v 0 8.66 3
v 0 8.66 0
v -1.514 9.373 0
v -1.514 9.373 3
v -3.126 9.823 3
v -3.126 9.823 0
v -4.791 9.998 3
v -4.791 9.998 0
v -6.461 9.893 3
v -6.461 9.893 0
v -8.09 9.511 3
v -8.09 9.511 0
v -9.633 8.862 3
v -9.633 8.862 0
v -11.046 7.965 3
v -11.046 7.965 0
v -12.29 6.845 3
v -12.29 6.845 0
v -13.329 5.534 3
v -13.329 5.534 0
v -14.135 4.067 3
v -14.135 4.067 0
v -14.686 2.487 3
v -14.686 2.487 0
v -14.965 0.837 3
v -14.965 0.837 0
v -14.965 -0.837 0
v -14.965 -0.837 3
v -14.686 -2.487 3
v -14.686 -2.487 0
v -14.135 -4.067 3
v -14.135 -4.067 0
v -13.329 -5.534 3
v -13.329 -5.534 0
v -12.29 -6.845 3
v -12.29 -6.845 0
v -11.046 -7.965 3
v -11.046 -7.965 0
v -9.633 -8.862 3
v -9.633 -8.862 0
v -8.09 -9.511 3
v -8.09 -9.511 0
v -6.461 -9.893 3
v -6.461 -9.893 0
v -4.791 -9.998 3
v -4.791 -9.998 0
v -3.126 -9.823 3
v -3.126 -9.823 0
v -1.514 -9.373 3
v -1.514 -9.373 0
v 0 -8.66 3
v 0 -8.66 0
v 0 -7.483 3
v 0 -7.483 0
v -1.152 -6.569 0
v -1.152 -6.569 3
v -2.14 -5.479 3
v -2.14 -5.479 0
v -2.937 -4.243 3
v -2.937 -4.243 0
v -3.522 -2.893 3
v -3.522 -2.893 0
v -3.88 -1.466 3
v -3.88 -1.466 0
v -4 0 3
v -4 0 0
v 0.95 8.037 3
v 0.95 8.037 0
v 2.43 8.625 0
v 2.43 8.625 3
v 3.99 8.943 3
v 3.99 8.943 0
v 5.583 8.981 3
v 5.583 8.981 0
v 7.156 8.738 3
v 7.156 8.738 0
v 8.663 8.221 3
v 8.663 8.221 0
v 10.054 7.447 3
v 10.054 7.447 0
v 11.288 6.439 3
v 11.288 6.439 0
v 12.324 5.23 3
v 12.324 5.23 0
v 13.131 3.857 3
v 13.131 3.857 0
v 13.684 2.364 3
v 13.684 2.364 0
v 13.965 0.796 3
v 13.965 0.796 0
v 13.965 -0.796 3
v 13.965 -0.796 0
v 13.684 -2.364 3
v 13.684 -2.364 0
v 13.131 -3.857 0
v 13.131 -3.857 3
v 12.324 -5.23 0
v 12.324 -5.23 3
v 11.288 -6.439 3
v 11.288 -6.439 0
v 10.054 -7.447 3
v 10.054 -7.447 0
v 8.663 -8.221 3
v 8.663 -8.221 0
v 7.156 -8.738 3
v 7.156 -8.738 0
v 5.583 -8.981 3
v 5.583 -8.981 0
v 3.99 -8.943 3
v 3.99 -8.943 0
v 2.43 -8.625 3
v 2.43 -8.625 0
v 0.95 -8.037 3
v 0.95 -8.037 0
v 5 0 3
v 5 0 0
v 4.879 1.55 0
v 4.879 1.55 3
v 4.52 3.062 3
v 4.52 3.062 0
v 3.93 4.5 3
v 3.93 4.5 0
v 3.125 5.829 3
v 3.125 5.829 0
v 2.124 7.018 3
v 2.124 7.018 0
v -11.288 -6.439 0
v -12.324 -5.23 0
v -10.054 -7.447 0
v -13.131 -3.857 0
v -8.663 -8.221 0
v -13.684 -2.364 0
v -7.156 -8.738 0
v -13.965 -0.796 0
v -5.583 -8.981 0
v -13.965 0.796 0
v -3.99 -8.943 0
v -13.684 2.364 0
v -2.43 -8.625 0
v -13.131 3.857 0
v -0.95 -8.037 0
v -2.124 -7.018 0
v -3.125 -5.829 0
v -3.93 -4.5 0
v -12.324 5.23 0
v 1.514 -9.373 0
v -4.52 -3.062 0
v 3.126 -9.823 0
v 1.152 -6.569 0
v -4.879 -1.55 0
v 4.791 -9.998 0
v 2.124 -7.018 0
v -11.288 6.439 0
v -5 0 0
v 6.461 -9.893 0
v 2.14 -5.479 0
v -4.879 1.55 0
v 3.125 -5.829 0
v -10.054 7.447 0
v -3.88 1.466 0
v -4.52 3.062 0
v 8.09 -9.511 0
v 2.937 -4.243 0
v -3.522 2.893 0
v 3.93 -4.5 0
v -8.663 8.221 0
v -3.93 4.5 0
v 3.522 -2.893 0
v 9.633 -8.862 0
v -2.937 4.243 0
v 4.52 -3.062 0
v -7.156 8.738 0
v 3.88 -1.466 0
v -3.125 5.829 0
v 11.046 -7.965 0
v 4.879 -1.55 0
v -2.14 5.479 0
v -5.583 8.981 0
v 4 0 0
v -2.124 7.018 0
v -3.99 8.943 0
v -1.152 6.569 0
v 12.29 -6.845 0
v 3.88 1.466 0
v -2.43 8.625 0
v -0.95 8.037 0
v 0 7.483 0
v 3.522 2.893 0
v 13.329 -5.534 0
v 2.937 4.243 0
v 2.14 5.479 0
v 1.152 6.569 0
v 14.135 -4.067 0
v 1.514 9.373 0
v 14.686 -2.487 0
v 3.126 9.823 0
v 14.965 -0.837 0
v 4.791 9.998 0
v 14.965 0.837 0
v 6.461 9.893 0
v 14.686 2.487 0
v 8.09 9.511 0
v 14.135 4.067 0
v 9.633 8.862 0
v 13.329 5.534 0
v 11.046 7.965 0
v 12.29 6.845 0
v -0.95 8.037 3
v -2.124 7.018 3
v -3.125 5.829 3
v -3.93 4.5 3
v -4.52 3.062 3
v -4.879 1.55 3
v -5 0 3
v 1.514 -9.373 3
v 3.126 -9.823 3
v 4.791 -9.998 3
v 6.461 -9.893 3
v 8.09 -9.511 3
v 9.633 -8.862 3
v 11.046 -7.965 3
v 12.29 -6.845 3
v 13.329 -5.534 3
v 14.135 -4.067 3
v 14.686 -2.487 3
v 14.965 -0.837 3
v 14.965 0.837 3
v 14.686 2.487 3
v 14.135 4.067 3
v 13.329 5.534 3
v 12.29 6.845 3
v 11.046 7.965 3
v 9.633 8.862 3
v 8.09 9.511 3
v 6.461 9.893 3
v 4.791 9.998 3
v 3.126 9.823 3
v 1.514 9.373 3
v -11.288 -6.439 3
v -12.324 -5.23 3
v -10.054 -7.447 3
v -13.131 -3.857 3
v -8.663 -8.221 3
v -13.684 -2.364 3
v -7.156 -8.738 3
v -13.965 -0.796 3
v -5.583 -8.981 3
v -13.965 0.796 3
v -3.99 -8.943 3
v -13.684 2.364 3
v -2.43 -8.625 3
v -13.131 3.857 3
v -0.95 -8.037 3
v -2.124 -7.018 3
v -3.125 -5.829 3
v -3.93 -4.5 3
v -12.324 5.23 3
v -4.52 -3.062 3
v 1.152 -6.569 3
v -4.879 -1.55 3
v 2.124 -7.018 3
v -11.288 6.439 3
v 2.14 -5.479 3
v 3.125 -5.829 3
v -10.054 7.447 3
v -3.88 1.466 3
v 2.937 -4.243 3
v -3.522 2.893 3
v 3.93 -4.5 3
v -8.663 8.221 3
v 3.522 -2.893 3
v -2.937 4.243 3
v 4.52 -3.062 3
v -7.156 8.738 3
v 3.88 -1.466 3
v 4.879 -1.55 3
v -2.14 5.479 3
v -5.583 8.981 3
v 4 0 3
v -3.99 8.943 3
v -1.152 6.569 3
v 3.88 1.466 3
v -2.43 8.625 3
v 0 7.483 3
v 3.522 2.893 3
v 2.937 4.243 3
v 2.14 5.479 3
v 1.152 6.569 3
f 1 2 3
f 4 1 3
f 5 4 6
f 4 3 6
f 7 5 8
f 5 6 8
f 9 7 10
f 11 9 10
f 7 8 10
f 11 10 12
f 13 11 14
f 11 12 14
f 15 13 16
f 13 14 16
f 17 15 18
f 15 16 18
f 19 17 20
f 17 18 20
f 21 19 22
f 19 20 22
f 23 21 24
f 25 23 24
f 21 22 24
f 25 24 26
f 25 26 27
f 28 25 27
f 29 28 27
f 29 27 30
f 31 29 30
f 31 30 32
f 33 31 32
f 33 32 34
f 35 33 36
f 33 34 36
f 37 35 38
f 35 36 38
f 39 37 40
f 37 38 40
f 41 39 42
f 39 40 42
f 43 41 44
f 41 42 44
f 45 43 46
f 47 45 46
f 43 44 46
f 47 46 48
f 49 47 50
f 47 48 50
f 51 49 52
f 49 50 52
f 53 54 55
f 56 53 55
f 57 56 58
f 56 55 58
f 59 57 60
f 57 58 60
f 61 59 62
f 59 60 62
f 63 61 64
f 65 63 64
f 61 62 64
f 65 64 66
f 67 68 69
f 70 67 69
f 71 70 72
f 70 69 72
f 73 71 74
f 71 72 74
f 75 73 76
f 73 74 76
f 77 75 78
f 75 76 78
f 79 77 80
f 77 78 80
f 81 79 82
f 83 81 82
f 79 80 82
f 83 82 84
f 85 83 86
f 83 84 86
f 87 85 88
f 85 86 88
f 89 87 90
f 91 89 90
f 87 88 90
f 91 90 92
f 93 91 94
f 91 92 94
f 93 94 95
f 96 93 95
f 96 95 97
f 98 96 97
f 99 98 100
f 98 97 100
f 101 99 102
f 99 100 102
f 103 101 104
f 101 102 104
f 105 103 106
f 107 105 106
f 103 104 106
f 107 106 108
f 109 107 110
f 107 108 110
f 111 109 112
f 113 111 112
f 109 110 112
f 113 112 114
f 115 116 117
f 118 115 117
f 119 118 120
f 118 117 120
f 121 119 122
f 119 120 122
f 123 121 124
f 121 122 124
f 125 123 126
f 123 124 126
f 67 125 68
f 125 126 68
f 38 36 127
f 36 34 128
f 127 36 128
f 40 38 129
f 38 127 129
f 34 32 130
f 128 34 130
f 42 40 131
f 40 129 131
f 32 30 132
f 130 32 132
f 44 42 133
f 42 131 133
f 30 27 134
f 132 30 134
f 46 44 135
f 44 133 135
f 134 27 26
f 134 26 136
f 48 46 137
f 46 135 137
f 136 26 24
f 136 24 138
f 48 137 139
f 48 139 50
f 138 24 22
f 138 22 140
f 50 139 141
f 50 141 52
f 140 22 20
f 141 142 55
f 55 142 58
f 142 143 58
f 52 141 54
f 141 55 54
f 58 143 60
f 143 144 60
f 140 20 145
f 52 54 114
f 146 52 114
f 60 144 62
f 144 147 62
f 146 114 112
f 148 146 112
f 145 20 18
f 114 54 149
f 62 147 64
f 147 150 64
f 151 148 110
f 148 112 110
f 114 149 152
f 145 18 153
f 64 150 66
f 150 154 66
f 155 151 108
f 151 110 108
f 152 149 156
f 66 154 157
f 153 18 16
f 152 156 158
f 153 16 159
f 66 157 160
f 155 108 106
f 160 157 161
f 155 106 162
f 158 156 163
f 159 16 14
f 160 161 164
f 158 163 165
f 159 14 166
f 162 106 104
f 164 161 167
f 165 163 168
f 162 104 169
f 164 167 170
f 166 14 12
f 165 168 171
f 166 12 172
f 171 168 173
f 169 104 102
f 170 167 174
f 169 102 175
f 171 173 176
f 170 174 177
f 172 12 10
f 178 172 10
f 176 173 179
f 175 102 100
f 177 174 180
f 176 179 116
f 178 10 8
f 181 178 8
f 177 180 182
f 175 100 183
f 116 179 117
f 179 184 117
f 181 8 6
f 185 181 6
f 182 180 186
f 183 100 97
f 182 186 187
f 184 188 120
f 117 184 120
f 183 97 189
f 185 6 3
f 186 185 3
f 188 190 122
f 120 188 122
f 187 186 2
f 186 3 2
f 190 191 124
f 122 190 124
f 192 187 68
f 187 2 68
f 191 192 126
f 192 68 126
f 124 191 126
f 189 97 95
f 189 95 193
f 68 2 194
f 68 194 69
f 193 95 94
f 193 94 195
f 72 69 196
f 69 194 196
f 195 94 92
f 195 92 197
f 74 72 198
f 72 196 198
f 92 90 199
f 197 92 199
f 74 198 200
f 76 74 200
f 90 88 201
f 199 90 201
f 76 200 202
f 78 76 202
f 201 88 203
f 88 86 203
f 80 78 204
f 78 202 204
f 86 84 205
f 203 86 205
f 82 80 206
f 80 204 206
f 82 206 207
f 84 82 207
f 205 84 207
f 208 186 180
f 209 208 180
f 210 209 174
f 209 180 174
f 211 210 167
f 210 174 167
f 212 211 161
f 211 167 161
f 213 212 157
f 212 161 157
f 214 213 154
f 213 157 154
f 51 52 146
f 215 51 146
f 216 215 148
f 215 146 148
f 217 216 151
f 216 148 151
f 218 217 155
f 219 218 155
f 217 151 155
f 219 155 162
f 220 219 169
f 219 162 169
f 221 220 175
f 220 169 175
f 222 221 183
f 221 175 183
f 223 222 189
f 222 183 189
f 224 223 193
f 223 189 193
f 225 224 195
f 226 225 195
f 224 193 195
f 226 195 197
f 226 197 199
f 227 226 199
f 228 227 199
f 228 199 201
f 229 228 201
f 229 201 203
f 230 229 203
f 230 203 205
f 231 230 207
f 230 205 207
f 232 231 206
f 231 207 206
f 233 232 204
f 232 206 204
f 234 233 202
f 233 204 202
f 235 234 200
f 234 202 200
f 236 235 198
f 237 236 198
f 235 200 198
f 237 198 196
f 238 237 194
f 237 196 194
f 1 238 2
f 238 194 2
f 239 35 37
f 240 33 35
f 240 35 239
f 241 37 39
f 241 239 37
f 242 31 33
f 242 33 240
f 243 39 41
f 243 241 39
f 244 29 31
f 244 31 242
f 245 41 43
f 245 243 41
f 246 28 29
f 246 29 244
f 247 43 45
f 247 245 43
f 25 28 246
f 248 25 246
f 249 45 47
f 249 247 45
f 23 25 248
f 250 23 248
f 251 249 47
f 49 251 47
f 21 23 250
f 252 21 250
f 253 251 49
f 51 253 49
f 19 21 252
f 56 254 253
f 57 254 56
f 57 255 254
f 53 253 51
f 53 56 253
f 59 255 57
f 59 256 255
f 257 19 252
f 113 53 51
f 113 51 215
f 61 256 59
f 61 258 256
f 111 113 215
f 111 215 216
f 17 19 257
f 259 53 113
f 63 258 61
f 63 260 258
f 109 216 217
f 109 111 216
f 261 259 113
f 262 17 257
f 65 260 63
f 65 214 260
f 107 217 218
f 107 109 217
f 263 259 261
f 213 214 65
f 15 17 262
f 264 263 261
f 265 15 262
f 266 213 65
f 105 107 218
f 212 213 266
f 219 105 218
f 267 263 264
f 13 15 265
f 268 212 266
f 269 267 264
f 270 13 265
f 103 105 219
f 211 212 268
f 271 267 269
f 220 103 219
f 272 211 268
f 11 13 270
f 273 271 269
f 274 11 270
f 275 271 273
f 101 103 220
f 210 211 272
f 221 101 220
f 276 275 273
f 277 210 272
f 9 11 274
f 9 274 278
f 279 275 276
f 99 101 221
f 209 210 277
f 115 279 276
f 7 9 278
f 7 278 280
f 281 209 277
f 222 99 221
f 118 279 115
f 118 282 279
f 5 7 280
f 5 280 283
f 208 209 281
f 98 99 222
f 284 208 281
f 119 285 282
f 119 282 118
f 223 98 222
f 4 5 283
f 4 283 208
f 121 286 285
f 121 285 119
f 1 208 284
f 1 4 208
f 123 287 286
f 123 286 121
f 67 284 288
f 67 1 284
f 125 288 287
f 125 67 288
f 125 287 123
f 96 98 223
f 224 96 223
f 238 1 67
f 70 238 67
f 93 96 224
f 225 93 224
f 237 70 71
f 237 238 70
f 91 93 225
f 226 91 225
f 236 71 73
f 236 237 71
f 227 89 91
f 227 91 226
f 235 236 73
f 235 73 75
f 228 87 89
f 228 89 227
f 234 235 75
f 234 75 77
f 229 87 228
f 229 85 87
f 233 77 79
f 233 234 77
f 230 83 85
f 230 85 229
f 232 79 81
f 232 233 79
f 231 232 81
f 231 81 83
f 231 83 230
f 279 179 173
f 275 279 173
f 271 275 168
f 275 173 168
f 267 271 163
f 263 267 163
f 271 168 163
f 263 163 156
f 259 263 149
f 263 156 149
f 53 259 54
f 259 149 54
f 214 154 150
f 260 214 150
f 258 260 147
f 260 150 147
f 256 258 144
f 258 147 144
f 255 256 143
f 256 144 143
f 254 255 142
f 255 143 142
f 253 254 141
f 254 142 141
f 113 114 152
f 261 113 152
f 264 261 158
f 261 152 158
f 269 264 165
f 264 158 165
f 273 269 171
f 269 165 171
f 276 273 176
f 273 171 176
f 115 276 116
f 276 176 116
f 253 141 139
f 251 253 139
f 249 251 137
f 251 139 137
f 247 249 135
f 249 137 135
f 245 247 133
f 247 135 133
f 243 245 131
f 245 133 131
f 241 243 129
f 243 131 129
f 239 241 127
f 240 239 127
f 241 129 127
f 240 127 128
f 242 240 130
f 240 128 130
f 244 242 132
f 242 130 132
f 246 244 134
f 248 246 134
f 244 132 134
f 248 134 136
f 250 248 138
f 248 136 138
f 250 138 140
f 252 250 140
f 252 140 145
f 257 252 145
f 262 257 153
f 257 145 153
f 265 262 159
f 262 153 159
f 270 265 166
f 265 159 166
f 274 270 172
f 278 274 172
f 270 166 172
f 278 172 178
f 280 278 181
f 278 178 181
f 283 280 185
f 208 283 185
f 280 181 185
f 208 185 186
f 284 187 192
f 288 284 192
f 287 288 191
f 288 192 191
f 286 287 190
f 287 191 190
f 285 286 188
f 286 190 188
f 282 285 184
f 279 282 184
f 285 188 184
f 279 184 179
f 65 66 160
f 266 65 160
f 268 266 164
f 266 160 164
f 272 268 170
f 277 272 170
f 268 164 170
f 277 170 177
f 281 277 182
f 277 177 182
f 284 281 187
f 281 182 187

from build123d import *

# Parameters (mm, degrees)
F1_DEPTH = 3


with BuildPart() as f1:
    # F0 (on Top) → F1 (new body)
    with BuildSketch(Plane.XY):
        with BuildLine():
            ThreePointArc((0, 8.660254), (-15, 0), (0, -8.660254))
            ThreePointArc((0, -8.660254), (15, 0), (0, 8.660254))
        make_face()
        with BuildLine():
            ThreePointArc((-0.95, 8.037257), (-3.930286, 4.5), (-5, 0))
            ThreePointArc((-5, 0), (-3.930286, -4.5), (-0.95, -8.037257))
            ThreePointArc((-0.95, -8.037257), (-14, 0), (-0.95, 8.037257))
        make_face(mode=Mode.SUBTRACT)
        with BuildLine():
            ThreePointArc((0, -7.483315), (-2.937254, -4.242641), (-4, 0))
            ThreePointArc((-4, 0), (-2.937254, 4.242641), (0, 7.483315))
            ThreePointArc((0, 7.483315), (2.937254, 4.242641), (4, 0))
            ThreePointArc((4, 0), (2.937254, -4.242641), (0, -7.483315))
        make_face(mode=Mode.SUBTRACT)
        with BuildLine():
            ThreePointArc((0.95, -8.037257), (3.930286, -4.5), (5, 0))
            ThreePointArc((5, 0), (3.930286, 4.5), (0.95, 8.037257))
            ThreePointArc((0.95, 8.037257), (14, 0), (0.95, -8.037257))
        make_face(mode=Mode.SUBTRACT)
    extrude(amount=F1_DEPTH)


solid = f1.part
